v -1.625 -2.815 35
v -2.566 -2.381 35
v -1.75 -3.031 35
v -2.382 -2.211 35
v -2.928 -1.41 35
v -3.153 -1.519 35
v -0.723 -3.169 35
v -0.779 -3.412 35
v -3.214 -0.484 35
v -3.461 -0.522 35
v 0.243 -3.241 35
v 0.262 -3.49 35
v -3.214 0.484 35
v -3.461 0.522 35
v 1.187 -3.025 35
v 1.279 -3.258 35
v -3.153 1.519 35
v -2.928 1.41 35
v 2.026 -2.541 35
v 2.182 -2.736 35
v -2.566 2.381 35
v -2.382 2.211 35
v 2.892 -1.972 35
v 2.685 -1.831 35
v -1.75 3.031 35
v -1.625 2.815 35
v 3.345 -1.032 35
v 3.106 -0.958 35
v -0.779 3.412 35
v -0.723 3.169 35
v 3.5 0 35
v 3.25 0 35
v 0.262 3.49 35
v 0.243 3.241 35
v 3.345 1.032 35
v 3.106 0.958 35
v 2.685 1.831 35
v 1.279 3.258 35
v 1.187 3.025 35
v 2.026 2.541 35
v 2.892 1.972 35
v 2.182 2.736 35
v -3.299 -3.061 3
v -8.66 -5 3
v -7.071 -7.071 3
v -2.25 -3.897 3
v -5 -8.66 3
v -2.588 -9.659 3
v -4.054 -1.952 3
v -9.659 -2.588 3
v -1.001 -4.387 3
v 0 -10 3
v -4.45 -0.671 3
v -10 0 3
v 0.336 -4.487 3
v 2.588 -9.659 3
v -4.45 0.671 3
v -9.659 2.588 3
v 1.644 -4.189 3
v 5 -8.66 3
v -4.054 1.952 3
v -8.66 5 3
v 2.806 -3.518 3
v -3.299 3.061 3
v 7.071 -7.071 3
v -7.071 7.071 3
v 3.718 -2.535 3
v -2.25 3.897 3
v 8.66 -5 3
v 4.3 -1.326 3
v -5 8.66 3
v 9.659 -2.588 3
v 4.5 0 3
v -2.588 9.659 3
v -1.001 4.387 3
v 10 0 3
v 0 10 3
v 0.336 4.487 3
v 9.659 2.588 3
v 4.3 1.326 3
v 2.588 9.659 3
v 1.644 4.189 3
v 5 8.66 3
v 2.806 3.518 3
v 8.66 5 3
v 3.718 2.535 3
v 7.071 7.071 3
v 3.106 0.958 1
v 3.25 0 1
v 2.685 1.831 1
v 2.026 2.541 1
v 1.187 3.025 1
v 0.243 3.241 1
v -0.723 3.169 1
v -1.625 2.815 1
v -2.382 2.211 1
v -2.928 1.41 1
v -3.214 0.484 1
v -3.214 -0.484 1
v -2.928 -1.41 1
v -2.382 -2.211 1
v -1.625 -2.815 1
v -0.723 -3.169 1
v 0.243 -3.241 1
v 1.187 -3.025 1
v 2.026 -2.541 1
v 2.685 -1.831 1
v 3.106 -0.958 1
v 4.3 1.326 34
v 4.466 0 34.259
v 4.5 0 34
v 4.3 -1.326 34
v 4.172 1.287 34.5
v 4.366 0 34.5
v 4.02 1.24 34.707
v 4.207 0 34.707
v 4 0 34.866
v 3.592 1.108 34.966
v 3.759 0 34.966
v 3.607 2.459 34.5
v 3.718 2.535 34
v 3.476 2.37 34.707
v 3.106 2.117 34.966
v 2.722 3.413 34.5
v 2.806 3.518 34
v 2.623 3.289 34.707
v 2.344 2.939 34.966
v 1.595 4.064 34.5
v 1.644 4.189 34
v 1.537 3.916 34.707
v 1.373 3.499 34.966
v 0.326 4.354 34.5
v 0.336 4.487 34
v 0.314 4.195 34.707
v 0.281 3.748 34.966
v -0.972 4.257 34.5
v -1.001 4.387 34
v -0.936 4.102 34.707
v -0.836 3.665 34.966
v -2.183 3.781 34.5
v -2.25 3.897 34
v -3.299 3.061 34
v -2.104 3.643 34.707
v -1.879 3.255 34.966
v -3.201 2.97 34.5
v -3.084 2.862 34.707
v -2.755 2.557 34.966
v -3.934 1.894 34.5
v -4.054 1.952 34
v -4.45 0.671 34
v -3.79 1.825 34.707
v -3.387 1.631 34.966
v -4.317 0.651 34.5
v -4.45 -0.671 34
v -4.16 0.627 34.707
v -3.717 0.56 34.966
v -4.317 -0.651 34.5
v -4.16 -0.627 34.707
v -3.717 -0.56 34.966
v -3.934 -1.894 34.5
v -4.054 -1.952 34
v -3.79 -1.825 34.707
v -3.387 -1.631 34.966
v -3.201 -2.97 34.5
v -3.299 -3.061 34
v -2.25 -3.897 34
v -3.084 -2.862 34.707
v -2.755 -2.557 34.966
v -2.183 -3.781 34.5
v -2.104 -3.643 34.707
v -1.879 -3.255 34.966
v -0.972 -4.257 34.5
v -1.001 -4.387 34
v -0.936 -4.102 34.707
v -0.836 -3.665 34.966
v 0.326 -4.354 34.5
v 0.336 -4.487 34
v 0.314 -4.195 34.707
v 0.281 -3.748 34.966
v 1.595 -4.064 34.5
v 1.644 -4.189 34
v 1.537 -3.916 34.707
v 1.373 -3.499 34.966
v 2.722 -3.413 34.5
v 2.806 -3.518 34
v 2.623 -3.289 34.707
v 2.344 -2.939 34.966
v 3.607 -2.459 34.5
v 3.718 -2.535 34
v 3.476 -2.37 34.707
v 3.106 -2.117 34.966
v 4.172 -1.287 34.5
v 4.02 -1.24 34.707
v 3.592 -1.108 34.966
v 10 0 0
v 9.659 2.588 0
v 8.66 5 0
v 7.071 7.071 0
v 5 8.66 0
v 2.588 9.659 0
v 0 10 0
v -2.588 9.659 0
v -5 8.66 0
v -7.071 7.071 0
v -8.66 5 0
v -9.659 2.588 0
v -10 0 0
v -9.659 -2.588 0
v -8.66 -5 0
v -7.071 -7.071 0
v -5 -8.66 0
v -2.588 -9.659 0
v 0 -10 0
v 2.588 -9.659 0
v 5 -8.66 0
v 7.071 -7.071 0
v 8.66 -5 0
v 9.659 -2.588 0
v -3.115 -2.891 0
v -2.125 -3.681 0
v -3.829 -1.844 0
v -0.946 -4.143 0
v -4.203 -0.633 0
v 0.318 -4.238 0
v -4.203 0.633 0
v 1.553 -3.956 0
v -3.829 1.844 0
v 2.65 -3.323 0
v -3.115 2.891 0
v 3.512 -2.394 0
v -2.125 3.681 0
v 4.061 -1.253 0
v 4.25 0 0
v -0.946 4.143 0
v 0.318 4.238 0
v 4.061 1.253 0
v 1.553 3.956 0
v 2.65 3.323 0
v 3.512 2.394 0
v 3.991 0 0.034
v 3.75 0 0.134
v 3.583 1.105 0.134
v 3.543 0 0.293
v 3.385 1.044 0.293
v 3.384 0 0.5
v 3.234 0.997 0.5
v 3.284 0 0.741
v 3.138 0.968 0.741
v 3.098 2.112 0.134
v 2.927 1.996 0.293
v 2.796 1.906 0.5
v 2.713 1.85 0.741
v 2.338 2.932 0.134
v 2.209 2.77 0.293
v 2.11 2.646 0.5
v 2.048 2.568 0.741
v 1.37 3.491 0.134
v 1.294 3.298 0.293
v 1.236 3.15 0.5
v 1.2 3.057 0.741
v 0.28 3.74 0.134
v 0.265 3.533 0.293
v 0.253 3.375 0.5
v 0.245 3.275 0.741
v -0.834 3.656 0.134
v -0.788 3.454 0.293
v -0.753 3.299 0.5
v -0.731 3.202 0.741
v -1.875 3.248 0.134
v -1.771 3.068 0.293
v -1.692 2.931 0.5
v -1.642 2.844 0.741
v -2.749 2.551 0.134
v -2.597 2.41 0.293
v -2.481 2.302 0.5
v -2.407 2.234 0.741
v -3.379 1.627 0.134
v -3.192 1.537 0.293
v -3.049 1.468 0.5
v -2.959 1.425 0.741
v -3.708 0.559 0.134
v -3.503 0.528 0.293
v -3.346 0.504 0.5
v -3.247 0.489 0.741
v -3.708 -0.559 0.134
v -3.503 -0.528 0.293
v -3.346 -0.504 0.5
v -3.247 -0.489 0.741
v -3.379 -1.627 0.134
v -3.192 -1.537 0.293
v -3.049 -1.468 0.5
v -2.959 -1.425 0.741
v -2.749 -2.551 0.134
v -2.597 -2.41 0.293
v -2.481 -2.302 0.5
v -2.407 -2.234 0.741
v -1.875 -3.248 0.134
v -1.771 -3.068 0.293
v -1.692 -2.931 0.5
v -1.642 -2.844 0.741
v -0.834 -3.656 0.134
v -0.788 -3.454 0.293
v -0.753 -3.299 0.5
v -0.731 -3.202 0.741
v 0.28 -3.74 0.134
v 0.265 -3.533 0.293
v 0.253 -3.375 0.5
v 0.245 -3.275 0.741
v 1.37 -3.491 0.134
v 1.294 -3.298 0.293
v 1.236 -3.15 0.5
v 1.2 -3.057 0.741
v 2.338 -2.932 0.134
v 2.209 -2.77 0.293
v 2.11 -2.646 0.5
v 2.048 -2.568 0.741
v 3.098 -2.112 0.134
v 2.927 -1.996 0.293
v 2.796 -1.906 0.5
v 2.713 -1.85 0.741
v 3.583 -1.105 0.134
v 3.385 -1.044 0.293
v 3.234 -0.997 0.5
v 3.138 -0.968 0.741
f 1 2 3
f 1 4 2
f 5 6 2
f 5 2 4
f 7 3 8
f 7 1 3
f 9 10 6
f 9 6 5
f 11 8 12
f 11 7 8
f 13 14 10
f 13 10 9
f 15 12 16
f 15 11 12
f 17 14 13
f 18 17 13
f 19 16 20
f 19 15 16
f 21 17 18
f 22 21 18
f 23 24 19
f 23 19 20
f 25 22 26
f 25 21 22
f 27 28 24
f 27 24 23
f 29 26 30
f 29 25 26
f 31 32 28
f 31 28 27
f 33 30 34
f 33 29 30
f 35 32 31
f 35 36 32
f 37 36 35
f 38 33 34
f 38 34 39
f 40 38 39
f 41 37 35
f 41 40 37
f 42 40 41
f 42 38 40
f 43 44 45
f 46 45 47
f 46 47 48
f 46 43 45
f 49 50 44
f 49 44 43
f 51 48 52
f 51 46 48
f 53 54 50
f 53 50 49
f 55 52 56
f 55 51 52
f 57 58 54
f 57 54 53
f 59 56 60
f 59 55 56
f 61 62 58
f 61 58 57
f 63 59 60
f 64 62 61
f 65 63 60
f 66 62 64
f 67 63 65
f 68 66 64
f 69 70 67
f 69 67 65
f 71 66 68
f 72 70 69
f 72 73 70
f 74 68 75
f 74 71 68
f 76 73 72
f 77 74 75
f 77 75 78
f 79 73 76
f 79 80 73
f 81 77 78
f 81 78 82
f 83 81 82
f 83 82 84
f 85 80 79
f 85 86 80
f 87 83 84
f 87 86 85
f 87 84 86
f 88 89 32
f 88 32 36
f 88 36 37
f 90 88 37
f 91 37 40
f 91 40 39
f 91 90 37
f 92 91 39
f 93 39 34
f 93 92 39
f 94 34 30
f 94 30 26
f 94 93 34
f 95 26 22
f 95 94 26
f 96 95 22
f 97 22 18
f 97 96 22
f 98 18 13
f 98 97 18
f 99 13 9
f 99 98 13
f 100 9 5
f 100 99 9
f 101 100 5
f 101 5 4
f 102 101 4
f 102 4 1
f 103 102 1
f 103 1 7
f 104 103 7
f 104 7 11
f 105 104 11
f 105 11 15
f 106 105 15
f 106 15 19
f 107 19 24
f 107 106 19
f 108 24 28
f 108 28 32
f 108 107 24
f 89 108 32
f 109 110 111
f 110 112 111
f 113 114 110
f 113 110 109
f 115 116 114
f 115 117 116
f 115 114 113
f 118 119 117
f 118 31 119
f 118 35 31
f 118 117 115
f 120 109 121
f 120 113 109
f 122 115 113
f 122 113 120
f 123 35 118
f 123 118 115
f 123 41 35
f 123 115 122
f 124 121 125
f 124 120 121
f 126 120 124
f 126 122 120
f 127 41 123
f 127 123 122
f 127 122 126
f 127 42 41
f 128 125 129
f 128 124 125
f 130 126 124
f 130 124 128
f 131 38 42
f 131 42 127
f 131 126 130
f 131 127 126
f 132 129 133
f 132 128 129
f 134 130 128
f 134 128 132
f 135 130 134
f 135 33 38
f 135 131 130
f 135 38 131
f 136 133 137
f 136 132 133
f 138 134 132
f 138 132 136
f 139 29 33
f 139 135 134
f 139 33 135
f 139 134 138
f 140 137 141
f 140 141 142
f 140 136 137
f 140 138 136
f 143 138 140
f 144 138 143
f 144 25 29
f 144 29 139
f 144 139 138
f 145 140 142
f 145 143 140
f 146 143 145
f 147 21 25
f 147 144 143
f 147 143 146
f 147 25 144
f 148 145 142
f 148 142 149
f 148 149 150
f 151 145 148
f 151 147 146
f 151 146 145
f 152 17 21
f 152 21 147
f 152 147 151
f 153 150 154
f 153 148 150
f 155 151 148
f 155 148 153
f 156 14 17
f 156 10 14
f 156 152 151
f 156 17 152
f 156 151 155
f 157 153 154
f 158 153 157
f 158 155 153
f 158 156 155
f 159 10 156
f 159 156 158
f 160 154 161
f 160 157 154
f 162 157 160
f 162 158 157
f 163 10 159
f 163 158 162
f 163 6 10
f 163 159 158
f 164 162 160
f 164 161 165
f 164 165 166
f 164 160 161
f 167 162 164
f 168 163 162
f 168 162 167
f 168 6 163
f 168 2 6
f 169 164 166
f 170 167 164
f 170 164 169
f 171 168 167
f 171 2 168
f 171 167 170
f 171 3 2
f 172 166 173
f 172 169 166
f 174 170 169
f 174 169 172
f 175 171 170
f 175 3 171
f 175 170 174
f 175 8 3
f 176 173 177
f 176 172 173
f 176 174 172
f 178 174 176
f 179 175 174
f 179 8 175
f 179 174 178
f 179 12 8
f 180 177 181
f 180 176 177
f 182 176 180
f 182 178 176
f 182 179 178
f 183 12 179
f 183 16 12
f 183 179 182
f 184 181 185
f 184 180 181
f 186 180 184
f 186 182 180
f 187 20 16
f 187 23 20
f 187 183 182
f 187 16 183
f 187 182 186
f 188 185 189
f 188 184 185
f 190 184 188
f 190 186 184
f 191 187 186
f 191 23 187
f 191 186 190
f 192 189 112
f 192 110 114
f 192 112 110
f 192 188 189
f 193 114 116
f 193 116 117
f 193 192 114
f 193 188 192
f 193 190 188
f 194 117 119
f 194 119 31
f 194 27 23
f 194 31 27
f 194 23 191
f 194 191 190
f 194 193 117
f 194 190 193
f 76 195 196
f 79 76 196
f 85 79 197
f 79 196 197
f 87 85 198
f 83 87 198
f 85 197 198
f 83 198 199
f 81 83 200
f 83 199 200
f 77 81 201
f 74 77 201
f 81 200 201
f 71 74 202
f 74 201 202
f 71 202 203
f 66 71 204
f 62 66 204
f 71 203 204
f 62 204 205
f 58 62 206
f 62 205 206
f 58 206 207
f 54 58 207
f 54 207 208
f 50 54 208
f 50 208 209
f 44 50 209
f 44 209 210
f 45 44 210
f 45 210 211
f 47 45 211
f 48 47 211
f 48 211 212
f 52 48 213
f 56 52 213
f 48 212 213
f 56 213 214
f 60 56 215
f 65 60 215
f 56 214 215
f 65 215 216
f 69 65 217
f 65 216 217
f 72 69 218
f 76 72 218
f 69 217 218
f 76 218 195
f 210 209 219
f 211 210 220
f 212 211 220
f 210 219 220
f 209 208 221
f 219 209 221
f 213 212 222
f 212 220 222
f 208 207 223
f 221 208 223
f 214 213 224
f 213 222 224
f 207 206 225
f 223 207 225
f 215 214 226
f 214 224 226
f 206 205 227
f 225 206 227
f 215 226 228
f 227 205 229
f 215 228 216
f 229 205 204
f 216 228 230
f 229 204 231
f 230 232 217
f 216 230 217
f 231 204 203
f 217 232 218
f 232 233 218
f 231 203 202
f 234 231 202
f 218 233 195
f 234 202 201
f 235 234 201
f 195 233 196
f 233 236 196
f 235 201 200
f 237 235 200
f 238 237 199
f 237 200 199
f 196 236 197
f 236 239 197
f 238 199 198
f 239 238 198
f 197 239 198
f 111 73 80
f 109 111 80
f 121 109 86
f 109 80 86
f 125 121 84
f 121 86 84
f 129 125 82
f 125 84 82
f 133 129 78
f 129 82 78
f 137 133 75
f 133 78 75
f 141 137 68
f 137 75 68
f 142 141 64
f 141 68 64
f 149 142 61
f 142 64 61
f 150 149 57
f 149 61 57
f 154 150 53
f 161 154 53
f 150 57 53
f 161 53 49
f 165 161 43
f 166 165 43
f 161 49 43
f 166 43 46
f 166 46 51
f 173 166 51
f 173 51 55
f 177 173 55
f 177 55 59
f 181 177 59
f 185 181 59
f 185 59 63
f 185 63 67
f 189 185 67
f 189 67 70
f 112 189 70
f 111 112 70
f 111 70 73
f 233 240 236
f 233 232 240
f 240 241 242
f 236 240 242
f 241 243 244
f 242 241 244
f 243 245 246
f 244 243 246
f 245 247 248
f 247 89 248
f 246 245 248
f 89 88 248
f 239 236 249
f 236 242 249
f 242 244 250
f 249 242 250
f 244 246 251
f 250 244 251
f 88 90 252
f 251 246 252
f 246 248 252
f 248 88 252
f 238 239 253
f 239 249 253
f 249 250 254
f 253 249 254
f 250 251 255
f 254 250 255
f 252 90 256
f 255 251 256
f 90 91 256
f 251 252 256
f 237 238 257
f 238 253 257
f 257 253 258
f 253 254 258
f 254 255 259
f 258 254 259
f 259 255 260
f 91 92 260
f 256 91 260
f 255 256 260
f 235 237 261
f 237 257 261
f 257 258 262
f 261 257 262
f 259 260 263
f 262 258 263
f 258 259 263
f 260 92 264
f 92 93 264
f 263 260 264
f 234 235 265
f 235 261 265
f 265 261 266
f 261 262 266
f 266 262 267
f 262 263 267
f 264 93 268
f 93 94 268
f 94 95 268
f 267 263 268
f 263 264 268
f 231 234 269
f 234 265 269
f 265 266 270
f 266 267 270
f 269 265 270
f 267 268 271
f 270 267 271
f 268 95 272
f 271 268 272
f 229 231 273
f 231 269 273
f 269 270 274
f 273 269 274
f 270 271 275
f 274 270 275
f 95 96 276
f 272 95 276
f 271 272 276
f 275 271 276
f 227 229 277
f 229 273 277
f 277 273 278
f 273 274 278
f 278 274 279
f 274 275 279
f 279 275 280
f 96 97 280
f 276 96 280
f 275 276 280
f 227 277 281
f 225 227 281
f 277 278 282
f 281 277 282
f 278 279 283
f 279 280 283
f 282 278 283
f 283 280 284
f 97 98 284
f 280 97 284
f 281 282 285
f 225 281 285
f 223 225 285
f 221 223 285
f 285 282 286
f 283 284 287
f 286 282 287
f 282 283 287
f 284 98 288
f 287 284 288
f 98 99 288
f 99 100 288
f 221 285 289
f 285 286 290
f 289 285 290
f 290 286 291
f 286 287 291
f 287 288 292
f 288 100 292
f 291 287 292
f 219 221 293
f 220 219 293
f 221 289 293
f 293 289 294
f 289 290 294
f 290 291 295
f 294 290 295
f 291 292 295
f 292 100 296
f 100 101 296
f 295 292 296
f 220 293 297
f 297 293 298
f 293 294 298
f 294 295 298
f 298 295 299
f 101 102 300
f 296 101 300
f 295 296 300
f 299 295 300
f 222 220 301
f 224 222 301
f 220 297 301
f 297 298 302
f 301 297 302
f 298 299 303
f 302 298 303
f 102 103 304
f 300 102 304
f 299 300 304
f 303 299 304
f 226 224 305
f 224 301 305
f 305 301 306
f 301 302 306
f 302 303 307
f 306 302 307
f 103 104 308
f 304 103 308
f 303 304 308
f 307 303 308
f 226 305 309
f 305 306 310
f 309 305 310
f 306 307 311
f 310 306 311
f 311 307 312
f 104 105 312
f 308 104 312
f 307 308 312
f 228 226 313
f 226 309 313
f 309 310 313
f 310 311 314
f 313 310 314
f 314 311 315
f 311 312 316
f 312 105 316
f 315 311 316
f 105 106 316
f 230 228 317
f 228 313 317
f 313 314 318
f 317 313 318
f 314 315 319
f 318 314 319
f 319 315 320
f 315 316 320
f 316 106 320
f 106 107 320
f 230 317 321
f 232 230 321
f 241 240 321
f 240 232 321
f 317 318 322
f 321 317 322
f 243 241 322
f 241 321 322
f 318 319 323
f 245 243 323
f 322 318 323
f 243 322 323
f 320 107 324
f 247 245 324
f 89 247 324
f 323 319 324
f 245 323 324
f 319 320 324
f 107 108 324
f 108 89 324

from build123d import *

# Parameters (mm, degrees)
F0_R     = 10
F0_R_2   = 4.5
F0_R_3   = 3.25
F1_DEPTH = 3
F2_DEPTH = 35
F3_R     = 1


with BuildPart() as f1:
    # F0 (on Top) → F1 (new body)
    with BuildSketch(Plane.XY):
        Circle(F0_R)
        Circle(F0_R_2, mode=Mode.SUBTRACT)
        Circle(F0_R_2)
        Circle(F0_R_3, mode=Mode.SUBTRACT)
    extrude(amount=F1_DEPTH)

    # F0 (on Top) → F2 (join)
    with BuildSketch(Plane.XY):
        Circle(F0_R_2)
        Circle(F0_R_3, mode=Mode.SUBTRACT)
    extrude(amount=F2_DEPTH)

    # F3
    f3_edges = [f1.edges().sort_by_distance(p)[0] for p in [
        (-4.5, 0, 35),
        (-3.25, 0, 0),
    ]]
    fillet(f3_edges, radius=F3_R)


solid = f1.part
